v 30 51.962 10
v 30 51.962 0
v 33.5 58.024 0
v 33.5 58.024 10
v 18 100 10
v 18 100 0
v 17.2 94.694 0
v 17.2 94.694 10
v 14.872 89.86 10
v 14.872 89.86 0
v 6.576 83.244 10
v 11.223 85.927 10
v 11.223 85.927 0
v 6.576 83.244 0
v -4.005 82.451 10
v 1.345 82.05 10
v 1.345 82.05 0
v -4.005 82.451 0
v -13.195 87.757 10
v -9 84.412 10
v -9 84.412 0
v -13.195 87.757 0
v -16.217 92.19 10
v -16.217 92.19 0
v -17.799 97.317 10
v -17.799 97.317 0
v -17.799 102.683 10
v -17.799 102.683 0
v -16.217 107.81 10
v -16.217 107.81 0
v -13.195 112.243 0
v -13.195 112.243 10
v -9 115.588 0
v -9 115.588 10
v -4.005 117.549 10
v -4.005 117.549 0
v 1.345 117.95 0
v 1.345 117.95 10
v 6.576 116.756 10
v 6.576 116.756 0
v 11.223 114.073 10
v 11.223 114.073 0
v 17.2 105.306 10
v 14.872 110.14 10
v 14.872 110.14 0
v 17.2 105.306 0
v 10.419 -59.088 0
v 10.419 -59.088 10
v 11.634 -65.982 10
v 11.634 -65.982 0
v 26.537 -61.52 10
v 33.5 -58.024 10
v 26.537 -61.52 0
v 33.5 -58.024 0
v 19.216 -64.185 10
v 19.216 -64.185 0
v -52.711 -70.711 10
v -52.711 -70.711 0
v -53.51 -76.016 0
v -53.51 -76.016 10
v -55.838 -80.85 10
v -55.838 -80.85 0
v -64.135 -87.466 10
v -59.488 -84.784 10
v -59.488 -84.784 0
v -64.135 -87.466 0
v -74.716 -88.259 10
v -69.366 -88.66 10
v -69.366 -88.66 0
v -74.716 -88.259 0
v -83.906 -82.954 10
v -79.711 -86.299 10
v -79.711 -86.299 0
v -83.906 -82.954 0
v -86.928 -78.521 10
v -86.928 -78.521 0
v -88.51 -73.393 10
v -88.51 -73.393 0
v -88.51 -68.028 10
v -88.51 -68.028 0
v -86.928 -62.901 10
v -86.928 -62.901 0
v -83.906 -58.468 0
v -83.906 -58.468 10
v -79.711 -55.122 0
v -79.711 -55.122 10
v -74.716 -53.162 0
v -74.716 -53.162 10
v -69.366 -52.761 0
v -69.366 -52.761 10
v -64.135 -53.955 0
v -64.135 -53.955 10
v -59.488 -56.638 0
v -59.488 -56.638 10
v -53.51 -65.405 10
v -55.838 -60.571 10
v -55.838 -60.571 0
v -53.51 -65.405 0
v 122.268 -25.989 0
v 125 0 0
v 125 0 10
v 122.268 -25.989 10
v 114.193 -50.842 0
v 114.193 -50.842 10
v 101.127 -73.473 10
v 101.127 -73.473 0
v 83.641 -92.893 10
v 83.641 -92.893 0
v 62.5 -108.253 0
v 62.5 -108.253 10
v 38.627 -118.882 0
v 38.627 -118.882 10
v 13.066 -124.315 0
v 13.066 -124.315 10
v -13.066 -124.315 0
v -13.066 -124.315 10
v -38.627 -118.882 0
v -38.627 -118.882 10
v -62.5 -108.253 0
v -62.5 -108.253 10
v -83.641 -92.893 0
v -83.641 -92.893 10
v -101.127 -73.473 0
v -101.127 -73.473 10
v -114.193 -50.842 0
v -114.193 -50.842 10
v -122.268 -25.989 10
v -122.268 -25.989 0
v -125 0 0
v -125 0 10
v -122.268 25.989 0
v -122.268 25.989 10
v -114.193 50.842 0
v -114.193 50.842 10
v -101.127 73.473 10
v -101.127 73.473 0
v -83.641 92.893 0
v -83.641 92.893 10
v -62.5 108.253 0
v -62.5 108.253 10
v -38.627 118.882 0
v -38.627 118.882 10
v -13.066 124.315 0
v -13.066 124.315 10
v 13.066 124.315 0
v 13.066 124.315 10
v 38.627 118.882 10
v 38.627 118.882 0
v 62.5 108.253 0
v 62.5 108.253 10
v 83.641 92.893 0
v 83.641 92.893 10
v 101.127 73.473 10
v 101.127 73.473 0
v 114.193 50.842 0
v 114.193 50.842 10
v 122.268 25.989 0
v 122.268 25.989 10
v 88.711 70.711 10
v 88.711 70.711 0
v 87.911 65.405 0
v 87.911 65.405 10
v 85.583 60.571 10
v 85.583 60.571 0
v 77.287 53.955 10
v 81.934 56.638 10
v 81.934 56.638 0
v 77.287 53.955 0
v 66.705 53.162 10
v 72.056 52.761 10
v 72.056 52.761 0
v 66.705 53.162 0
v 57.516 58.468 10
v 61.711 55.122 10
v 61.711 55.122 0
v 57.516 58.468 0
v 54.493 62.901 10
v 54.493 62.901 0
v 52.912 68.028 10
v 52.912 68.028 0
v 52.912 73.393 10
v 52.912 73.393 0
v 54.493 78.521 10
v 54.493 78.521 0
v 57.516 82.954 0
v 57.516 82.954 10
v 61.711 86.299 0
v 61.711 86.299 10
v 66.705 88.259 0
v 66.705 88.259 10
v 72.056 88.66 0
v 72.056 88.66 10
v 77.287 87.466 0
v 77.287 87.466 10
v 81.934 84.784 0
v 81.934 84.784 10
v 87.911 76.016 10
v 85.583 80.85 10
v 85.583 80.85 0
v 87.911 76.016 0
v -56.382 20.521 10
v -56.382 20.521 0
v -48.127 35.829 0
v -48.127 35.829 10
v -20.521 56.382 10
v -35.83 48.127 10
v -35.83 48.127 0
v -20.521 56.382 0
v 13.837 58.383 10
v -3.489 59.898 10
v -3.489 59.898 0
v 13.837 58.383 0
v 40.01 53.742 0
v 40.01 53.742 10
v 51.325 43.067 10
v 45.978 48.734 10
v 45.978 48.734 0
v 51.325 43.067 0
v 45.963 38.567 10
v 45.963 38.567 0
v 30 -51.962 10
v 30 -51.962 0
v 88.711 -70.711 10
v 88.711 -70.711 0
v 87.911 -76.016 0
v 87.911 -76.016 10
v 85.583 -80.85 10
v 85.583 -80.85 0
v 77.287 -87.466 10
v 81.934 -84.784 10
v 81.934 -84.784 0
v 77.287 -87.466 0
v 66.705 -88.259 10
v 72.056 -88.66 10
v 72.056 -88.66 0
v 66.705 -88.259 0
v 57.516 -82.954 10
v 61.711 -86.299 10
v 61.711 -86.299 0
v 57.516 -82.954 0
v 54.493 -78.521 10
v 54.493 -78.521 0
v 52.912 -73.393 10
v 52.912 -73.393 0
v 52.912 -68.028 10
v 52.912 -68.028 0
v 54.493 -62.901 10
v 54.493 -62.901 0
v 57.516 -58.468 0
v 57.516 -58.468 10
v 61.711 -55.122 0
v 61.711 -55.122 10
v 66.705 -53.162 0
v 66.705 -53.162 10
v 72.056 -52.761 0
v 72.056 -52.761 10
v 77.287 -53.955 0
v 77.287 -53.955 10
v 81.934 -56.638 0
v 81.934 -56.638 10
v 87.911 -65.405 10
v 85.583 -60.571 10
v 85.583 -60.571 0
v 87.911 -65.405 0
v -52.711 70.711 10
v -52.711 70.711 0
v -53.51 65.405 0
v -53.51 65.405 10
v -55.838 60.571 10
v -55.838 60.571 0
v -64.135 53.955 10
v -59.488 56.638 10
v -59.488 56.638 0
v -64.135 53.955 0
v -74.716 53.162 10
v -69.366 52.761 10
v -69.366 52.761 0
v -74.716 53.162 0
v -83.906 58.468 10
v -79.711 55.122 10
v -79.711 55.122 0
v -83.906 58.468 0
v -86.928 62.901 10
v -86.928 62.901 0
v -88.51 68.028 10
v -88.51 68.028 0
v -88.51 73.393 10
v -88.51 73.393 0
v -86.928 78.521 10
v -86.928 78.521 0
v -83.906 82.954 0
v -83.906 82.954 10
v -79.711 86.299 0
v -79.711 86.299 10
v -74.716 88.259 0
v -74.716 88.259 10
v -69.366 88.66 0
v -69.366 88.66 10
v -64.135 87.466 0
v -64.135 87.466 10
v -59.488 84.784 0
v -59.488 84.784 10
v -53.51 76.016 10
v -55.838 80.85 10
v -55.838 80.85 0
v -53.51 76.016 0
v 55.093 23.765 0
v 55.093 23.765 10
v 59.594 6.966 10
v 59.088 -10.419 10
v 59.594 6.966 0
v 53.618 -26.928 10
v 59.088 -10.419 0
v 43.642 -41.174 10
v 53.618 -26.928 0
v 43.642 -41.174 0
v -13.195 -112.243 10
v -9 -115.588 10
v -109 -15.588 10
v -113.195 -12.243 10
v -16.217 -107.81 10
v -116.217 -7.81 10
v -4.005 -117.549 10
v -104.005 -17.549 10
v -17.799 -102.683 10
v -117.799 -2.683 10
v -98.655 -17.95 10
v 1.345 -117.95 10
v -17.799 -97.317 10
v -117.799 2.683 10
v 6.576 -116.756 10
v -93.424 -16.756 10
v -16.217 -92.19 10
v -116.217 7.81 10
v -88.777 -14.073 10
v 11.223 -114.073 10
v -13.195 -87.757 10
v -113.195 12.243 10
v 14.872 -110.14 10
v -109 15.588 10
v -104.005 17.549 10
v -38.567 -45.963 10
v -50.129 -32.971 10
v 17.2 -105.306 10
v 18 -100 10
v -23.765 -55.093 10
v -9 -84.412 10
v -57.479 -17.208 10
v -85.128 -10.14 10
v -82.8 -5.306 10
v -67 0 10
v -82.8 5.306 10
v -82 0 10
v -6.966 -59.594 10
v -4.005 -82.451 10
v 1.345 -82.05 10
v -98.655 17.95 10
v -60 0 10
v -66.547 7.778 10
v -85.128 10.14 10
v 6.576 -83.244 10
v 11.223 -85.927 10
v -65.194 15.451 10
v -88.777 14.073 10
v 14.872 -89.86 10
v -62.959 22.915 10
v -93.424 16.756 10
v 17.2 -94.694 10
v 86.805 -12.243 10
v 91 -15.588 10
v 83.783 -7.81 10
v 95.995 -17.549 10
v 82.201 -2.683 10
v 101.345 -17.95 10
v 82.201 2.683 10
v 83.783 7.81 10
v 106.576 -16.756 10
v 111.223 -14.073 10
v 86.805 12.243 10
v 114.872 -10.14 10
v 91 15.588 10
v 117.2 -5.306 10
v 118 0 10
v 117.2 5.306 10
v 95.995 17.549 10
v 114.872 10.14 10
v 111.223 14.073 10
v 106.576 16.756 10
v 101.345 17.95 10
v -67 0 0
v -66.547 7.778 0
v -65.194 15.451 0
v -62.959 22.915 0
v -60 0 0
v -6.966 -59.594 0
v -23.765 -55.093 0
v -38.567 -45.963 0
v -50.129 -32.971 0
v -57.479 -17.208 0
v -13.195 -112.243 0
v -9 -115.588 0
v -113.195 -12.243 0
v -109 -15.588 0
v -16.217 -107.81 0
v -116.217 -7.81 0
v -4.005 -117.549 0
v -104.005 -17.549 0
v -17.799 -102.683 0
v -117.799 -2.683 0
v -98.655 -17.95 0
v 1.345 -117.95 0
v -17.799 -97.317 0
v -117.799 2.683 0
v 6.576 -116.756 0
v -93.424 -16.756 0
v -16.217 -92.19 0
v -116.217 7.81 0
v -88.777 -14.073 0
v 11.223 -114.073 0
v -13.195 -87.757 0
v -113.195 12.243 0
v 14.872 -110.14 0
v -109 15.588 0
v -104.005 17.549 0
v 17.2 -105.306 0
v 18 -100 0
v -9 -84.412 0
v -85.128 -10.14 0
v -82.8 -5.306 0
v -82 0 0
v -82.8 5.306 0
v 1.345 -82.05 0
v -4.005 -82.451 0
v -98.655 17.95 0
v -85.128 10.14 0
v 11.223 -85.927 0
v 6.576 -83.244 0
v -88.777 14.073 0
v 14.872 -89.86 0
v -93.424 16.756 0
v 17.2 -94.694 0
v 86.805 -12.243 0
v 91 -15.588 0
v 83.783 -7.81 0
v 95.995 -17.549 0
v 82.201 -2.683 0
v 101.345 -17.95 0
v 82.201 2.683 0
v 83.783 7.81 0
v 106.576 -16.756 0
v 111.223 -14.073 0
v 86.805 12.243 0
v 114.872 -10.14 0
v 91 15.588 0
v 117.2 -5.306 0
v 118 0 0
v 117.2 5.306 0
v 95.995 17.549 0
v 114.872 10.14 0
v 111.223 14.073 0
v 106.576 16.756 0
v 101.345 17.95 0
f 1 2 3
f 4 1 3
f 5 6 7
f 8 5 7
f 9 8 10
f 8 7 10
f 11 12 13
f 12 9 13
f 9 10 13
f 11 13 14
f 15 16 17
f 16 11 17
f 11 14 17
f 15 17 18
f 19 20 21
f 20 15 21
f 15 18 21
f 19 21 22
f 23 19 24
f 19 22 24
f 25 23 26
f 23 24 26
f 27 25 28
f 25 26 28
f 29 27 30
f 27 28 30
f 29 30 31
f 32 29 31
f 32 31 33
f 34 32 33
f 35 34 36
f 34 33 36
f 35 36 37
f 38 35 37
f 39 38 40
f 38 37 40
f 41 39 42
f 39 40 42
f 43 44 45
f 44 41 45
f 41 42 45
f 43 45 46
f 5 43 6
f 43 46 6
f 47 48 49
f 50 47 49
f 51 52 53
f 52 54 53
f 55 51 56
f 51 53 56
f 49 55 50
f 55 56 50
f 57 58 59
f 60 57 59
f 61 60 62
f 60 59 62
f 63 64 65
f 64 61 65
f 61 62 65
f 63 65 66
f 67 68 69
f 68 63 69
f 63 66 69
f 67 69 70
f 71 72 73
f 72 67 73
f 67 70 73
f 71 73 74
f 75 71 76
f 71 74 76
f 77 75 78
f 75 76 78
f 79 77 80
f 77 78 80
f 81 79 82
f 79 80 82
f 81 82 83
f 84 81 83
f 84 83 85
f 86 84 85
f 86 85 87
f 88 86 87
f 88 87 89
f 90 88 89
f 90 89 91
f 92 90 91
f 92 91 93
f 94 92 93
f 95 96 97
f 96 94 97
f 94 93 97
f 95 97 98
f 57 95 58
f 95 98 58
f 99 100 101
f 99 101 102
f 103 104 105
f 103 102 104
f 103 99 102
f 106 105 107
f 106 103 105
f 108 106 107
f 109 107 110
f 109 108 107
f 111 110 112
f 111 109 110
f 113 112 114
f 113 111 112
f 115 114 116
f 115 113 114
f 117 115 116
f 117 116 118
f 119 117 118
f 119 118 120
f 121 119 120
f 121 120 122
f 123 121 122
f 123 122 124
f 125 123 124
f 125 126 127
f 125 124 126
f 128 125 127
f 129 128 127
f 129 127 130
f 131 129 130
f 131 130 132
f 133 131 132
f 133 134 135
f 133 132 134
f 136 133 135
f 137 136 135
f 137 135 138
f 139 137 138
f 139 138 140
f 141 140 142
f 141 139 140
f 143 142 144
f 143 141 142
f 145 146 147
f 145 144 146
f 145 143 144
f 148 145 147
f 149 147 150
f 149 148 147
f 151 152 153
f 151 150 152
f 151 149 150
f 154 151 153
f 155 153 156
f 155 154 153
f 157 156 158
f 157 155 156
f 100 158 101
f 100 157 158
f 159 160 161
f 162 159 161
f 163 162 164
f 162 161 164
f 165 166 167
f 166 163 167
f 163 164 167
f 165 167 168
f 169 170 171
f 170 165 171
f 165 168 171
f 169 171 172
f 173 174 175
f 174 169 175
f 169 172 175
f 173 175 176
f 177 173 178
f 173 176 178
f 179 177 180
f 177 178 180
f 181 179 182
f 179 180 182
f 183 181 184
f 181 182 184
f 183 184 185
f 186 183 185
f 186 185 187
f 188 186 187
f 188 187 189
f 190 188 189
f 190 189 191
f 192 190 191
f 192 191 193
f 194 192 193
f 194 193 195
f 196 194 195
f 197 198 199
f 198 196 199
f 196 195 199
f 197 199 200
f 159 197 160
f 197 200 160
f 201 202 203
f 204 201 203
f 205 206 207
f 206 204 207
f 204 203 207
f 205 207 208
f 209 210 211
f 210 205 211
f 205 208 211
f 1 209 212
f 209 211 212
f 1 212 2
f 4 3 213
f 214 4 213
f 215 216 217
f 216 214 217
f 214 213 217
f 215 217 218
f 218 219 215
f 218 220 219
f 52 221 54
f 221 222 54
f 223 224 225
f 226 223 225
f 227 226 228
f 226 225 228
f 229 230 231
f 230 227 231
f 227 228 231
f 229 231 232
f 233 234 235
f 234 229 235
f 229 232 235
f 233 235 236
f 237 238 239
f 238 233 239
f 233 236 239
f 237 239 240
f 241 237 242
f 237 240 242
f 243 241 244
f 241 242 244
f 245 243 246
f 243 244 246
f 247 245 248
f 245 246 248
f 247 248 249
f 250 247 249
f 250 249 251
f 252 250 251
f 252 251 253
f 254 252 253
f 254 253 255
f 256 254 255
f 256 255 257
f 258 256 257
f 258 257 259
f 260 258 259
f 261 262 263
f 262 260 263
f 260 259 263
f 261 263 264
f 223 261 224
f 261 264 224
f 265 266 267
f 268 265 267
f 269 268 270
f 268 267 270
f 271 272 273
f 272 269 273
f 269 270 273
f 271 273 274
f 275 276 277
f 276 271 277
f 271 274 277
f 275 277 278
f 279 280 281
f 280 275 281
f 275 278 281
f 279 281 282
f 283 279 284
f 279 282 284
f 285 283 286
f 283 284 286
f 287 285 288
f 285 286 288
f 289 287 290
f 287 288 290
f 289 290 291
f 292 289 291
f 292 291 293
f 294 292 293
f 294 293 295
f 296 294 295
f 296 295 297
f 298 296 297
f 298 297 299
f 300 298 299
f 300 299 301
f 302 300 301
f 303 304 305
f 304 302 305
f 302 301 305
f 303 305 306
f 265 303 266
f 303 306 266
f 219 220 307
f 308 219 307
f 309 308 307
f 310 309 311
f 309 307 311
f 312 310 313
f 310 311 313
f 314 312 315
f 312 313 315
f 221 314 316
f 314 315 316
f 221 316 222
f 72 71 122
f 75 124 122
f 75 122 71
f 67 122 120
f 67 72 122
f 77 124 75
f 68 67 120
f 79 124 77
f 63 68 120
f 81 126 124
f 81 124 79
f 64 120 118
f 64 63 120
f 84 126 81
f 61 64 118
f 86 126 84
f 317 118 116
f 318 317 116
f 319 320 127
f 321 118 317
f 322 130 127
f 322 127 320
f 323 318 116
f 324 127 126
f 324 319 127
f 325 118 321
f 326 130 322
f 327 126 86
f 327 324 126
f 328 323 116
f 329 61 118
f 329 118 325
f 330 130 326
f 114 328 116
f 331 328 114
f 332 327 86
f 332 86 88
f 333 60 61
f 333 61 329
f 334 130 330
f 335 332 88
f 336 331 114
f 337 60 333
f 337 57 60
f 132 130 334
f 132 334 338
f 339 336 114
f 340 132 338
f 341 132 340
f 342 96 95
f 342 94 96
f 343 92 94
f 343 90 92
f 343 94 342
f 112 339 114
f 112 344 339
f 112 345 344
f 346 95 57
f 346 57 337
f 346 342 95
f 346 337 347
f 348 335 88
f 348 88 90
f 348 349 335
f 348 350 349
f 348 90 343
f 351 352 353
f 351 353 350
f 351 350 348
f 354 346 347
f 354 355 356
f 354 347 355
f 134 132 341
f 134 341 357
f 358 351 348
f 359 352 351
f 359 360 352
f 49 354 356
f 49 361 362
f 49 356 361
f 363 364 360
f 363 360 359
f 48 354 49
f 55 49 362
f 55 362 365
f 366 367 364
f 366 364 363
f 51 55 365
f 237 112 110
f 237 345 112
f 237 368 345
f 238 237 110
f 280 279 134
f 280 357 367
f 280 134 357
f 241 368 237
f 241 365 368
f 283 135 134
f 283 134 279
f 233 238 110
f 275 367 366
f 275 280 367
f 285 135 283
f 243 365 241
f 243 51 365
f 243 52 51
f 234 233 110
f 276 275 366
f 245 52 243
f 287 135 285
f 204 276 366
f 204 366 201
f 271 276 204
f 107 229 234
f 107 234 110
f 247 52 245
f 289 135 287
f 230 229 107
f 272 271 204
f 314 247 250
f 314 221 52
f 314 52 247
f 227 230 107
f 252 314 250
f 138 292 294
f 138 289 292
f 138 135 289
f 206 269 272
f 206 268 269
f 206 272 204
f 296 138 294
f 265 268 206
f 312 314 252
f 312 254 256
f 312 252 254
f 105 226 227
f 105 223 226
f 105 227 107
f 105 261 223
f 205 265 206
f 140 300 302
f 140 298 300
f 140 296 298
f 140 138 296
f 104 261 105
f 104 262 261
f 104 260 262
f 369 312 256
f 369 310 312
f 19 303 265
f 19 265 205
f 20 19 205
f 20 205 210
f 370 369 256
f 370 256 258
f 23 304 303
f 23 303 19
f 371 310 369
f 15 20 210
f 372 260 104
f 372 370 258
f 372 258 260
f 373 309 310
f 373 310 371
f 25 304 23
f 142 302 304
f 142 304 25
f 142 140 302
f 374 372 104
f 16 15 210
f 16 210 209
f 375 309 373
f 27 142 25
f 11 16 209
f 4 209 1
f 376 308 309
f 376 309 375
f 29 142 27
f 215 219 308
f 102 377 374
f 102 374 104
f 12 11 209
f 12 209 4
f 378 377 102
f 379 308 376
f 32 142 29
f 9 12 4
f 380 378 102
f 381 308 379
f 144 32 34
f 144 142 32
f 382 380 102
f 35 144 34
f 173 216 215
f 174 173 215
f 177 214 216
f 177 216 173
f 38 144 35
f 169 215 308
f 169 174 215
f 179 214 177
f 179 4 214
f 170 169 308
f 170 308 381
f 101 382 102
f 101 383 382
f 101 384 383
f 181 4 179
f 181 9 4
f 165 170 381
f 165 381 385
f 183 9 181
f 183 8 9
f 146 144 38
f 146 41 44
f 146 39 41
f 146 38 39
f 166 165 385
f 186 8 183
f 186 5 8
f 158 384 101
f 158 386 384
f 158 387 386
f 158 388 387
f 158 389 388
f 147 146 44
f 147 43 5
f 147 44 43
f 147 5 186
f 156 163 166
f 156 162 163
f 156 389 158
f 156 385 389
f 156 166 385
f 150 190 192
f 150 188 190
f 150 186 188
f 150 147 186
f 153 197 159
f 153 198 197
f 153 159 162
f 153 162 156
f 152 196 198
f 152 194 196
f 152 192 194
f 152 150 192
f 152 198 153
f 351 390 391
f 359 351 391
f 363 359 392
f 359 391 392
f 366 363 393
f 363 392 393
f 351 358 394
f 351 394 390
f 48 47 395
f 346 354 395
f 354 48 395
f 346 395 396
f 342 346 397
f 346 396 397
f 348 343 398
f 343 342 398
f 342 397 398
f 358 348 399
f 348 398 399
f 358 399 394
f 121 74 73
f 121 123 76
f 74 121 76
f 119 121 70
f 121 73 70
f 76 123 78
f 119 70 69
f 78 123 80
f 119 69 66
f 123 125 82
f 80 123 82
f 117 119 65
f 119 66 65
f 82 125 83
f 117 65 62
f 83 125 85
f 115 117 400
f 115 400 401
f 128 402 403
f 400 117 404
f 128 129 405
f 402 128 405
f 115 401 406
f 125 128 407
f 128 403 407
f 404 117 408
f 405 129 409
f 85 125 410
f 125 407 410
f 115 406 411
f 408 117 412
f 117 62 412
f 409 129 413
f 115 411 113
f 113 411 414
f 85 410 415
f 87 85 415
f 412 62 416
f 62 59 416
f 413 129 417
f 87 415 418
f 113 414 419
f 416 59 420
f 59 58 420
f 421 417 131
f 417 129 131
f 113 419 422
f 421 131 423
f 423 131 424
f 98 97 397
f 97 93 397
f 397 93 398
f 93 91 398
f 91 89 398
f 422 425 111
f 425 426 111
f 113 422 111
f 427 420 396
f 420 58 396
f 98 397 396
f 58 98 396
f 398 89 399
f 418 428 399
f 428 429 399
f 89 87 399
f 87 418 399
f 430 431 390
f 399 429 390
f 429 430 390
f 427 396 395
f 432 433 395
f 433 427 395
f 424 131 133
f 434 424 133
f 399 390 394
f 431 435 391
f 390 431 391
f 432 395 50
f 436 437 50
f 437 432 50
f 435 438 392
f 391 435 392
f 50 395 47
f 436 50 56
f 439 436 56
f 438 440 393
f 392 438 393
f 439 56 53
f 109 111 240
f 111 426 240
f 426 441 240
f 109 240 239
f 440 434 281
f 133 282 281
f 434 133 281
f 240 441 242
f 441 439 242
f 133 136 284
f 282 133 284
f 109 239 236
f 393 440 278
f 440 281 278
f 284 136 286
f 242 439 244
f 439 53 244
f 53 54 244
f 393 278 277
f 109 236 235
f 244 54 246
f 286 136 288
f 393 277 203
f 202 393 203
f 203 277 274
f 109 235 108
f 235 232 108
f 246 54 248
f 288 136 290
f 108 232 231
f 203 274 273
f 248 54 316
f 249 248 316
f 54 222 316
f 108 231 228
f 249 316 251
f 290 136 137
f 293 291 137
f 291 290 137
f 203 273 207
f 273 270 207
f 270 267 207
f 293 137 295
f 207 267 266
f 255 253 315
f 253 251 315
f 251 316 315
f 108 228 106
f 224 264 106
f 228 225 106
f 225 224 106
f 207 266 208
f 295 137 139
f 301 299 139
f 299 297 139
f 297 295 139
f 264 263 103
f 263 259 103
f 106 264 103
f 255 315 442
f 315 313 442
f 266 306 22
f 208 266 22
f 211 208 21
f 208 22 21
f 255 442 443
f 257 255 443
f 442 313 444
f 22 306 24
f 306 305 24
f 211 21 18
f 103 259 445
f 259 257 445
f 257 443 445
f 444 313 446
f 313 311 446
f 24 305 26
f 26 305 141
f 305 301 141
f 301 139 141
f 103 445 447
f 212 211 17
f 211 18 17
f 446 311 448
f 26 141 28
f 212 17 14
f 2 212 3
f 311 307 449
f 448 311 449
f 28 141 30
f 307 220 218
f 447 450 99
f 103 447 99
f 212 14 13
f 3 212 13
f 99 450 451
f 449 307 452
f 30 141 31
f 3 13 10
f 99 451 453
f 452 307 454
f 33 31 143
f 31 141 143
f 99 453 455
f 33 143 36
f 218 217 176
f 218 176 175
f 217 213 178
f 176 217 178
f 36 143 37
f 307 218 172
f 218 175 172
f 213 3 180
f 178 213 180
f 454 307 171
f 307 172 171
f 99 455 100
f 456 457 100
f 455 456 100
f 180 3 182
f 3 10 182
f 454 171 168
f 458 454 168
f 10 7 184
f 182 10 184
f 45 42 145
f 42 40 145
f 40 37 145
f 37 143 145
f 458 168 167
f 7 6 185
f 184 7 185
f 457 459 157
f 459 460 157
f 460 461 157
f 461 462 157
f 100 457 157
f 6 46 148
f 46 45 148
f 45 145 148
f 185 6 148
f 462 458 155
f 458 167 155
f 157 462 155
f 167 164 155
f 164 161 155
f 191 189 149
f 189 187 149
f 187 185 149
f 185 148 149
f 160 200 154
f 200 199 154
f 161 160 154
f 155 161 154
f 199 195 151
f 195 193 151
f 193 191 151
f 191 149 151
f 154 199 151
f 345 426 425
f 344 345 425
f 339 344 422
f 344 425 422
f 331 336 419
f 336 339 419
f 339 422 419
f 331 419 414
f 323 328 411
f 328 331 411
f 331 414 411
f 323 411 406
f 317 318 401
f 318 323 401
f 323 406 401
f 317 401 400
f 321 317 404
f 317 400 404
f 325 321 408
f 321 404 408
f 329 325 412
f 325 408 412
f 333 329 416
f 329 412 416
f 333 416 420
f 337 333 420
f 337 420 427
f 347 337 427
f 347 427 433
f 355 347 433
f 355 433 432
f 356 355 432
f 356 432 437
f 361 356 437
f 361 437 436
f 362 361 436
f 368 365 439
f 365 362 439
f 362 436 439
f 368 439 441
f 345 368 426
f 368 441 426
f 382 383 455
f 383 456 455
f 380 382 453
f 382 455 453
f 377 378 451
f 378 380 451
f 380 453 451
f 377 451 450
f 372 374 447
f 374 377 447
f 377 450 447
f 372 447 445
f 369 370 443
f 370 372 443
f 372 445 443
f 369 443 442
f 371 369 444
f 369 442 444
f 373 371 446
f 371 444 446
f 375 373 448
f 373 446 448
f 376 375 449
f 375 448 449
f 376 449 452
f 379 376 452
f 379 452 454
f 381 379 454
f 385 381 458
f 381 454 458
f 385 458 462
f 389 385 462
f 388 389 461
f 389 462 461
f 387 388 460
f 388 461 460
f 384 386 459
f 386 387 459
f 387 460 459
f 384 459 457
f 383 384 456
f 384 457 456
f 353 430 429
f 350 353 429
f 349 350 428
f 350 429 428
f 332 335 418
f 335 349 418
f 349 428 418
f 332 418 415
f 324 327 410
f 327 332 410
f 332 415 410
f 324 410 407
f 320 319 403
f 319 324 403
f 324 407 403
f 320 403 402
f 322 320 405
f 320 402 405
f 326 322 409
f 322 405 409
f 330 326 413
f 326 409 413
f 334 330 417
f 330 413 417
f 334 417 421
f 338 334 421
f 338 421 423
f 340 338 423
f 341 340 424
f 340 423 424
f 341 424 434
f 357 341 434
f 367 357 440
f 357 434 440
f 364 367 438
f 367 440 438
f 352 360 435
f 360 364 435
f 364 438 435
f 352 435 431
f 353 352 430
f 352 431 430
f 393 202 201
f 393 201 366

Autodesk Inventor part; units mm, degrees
ref_plane "YZ Plane" through (0, 0, 0) normal (1, 0, 0) x (0, 1, 0)
ref_plane "XZ Plane" through (0, 0, 0) normal (0, 1, 0) x (-1, 0, 0)
ref_plane "XY Plane" through (0, 0, 0) normal (0, 0, 1) x (1, 0, 0)
sketch "Sketch1" plane through (0, 0, 0) normal (0, 0, 1) x (1, 0, 0)
  circle A0 centre (0, 0) radius 100 construction
  circle A1 centre (-100, 0) radius 18
  circle A2 centre (-70.7107, -70.7107) radius 18
  circle A3 centre (0, -100) radius 18
  circle A4 centre (70.7107, -70.7107) radius 18
  circle A5 centre (100, 0) radius 18
  circle A6 centre (70.7107, 70.7107) radius 18
  circle A7 centre (0, 100) radius 18
  circle A8 centre (-70.7107, 70.7107) radius 18
  circle A9 centre (0, 0) radius 125
  circle A10 centre (0, 0) radius 75
  circle A11 centre (0, 0) radius 67.5 construction
  circle A12 centre (0, 0) radius 67
  circle A13 centre (0, 0) radius 60
  line L0 (0, 0) -> (-67, 0)
  line L1 (0, 0) -> (-2.0269, 0)
  line L2 (0, 0) -> (-62.9594, 22.9153)
  line L3 (0, 0) -> (67, 0) construction
  line L4 (0, 0) -> (33.5, -58.0237)
  line L5 (0, 0) -> (11.6344, -65.9821)
  line L6 (0, 0) -> (33.5, 58.0237)
  line L7 (0, 0) -> (51.325, 43.0668)
  point P0 (1.0135, -1.7554)
  point P1 (1.0135, 1.7554)
  point P2 (10.4189, -59.0885)
  point P3 (-60, 0)
  point P4 (-56.3816, 20.5212)
  point P5 (30, 51.9615)
  point P6 (45.9627, 38.5673)
  point P7 (30, -51.9615)
  dimension "d0" = 200
  dimension "d1" = 36
  dimension "d4" = 360
  dimension "d6" = 250
  dimension "d7" = 150
  dimension "d10" = 135
  dimension "d11" = 134
  dimension "d12" = 120
  dimension "d13" = 160
  dimension "d16" = 360
extrude "Extrusion1" add sketch "Sketch1" along normal blind 10 contours A9 | A10 | A12 L4 A13 L7 | L6 A13 L2 A12 | A12 L0 A13 L5
equation "\"d0\" = OuterRadius"
equation "\"OuterRadius\" = 200"
